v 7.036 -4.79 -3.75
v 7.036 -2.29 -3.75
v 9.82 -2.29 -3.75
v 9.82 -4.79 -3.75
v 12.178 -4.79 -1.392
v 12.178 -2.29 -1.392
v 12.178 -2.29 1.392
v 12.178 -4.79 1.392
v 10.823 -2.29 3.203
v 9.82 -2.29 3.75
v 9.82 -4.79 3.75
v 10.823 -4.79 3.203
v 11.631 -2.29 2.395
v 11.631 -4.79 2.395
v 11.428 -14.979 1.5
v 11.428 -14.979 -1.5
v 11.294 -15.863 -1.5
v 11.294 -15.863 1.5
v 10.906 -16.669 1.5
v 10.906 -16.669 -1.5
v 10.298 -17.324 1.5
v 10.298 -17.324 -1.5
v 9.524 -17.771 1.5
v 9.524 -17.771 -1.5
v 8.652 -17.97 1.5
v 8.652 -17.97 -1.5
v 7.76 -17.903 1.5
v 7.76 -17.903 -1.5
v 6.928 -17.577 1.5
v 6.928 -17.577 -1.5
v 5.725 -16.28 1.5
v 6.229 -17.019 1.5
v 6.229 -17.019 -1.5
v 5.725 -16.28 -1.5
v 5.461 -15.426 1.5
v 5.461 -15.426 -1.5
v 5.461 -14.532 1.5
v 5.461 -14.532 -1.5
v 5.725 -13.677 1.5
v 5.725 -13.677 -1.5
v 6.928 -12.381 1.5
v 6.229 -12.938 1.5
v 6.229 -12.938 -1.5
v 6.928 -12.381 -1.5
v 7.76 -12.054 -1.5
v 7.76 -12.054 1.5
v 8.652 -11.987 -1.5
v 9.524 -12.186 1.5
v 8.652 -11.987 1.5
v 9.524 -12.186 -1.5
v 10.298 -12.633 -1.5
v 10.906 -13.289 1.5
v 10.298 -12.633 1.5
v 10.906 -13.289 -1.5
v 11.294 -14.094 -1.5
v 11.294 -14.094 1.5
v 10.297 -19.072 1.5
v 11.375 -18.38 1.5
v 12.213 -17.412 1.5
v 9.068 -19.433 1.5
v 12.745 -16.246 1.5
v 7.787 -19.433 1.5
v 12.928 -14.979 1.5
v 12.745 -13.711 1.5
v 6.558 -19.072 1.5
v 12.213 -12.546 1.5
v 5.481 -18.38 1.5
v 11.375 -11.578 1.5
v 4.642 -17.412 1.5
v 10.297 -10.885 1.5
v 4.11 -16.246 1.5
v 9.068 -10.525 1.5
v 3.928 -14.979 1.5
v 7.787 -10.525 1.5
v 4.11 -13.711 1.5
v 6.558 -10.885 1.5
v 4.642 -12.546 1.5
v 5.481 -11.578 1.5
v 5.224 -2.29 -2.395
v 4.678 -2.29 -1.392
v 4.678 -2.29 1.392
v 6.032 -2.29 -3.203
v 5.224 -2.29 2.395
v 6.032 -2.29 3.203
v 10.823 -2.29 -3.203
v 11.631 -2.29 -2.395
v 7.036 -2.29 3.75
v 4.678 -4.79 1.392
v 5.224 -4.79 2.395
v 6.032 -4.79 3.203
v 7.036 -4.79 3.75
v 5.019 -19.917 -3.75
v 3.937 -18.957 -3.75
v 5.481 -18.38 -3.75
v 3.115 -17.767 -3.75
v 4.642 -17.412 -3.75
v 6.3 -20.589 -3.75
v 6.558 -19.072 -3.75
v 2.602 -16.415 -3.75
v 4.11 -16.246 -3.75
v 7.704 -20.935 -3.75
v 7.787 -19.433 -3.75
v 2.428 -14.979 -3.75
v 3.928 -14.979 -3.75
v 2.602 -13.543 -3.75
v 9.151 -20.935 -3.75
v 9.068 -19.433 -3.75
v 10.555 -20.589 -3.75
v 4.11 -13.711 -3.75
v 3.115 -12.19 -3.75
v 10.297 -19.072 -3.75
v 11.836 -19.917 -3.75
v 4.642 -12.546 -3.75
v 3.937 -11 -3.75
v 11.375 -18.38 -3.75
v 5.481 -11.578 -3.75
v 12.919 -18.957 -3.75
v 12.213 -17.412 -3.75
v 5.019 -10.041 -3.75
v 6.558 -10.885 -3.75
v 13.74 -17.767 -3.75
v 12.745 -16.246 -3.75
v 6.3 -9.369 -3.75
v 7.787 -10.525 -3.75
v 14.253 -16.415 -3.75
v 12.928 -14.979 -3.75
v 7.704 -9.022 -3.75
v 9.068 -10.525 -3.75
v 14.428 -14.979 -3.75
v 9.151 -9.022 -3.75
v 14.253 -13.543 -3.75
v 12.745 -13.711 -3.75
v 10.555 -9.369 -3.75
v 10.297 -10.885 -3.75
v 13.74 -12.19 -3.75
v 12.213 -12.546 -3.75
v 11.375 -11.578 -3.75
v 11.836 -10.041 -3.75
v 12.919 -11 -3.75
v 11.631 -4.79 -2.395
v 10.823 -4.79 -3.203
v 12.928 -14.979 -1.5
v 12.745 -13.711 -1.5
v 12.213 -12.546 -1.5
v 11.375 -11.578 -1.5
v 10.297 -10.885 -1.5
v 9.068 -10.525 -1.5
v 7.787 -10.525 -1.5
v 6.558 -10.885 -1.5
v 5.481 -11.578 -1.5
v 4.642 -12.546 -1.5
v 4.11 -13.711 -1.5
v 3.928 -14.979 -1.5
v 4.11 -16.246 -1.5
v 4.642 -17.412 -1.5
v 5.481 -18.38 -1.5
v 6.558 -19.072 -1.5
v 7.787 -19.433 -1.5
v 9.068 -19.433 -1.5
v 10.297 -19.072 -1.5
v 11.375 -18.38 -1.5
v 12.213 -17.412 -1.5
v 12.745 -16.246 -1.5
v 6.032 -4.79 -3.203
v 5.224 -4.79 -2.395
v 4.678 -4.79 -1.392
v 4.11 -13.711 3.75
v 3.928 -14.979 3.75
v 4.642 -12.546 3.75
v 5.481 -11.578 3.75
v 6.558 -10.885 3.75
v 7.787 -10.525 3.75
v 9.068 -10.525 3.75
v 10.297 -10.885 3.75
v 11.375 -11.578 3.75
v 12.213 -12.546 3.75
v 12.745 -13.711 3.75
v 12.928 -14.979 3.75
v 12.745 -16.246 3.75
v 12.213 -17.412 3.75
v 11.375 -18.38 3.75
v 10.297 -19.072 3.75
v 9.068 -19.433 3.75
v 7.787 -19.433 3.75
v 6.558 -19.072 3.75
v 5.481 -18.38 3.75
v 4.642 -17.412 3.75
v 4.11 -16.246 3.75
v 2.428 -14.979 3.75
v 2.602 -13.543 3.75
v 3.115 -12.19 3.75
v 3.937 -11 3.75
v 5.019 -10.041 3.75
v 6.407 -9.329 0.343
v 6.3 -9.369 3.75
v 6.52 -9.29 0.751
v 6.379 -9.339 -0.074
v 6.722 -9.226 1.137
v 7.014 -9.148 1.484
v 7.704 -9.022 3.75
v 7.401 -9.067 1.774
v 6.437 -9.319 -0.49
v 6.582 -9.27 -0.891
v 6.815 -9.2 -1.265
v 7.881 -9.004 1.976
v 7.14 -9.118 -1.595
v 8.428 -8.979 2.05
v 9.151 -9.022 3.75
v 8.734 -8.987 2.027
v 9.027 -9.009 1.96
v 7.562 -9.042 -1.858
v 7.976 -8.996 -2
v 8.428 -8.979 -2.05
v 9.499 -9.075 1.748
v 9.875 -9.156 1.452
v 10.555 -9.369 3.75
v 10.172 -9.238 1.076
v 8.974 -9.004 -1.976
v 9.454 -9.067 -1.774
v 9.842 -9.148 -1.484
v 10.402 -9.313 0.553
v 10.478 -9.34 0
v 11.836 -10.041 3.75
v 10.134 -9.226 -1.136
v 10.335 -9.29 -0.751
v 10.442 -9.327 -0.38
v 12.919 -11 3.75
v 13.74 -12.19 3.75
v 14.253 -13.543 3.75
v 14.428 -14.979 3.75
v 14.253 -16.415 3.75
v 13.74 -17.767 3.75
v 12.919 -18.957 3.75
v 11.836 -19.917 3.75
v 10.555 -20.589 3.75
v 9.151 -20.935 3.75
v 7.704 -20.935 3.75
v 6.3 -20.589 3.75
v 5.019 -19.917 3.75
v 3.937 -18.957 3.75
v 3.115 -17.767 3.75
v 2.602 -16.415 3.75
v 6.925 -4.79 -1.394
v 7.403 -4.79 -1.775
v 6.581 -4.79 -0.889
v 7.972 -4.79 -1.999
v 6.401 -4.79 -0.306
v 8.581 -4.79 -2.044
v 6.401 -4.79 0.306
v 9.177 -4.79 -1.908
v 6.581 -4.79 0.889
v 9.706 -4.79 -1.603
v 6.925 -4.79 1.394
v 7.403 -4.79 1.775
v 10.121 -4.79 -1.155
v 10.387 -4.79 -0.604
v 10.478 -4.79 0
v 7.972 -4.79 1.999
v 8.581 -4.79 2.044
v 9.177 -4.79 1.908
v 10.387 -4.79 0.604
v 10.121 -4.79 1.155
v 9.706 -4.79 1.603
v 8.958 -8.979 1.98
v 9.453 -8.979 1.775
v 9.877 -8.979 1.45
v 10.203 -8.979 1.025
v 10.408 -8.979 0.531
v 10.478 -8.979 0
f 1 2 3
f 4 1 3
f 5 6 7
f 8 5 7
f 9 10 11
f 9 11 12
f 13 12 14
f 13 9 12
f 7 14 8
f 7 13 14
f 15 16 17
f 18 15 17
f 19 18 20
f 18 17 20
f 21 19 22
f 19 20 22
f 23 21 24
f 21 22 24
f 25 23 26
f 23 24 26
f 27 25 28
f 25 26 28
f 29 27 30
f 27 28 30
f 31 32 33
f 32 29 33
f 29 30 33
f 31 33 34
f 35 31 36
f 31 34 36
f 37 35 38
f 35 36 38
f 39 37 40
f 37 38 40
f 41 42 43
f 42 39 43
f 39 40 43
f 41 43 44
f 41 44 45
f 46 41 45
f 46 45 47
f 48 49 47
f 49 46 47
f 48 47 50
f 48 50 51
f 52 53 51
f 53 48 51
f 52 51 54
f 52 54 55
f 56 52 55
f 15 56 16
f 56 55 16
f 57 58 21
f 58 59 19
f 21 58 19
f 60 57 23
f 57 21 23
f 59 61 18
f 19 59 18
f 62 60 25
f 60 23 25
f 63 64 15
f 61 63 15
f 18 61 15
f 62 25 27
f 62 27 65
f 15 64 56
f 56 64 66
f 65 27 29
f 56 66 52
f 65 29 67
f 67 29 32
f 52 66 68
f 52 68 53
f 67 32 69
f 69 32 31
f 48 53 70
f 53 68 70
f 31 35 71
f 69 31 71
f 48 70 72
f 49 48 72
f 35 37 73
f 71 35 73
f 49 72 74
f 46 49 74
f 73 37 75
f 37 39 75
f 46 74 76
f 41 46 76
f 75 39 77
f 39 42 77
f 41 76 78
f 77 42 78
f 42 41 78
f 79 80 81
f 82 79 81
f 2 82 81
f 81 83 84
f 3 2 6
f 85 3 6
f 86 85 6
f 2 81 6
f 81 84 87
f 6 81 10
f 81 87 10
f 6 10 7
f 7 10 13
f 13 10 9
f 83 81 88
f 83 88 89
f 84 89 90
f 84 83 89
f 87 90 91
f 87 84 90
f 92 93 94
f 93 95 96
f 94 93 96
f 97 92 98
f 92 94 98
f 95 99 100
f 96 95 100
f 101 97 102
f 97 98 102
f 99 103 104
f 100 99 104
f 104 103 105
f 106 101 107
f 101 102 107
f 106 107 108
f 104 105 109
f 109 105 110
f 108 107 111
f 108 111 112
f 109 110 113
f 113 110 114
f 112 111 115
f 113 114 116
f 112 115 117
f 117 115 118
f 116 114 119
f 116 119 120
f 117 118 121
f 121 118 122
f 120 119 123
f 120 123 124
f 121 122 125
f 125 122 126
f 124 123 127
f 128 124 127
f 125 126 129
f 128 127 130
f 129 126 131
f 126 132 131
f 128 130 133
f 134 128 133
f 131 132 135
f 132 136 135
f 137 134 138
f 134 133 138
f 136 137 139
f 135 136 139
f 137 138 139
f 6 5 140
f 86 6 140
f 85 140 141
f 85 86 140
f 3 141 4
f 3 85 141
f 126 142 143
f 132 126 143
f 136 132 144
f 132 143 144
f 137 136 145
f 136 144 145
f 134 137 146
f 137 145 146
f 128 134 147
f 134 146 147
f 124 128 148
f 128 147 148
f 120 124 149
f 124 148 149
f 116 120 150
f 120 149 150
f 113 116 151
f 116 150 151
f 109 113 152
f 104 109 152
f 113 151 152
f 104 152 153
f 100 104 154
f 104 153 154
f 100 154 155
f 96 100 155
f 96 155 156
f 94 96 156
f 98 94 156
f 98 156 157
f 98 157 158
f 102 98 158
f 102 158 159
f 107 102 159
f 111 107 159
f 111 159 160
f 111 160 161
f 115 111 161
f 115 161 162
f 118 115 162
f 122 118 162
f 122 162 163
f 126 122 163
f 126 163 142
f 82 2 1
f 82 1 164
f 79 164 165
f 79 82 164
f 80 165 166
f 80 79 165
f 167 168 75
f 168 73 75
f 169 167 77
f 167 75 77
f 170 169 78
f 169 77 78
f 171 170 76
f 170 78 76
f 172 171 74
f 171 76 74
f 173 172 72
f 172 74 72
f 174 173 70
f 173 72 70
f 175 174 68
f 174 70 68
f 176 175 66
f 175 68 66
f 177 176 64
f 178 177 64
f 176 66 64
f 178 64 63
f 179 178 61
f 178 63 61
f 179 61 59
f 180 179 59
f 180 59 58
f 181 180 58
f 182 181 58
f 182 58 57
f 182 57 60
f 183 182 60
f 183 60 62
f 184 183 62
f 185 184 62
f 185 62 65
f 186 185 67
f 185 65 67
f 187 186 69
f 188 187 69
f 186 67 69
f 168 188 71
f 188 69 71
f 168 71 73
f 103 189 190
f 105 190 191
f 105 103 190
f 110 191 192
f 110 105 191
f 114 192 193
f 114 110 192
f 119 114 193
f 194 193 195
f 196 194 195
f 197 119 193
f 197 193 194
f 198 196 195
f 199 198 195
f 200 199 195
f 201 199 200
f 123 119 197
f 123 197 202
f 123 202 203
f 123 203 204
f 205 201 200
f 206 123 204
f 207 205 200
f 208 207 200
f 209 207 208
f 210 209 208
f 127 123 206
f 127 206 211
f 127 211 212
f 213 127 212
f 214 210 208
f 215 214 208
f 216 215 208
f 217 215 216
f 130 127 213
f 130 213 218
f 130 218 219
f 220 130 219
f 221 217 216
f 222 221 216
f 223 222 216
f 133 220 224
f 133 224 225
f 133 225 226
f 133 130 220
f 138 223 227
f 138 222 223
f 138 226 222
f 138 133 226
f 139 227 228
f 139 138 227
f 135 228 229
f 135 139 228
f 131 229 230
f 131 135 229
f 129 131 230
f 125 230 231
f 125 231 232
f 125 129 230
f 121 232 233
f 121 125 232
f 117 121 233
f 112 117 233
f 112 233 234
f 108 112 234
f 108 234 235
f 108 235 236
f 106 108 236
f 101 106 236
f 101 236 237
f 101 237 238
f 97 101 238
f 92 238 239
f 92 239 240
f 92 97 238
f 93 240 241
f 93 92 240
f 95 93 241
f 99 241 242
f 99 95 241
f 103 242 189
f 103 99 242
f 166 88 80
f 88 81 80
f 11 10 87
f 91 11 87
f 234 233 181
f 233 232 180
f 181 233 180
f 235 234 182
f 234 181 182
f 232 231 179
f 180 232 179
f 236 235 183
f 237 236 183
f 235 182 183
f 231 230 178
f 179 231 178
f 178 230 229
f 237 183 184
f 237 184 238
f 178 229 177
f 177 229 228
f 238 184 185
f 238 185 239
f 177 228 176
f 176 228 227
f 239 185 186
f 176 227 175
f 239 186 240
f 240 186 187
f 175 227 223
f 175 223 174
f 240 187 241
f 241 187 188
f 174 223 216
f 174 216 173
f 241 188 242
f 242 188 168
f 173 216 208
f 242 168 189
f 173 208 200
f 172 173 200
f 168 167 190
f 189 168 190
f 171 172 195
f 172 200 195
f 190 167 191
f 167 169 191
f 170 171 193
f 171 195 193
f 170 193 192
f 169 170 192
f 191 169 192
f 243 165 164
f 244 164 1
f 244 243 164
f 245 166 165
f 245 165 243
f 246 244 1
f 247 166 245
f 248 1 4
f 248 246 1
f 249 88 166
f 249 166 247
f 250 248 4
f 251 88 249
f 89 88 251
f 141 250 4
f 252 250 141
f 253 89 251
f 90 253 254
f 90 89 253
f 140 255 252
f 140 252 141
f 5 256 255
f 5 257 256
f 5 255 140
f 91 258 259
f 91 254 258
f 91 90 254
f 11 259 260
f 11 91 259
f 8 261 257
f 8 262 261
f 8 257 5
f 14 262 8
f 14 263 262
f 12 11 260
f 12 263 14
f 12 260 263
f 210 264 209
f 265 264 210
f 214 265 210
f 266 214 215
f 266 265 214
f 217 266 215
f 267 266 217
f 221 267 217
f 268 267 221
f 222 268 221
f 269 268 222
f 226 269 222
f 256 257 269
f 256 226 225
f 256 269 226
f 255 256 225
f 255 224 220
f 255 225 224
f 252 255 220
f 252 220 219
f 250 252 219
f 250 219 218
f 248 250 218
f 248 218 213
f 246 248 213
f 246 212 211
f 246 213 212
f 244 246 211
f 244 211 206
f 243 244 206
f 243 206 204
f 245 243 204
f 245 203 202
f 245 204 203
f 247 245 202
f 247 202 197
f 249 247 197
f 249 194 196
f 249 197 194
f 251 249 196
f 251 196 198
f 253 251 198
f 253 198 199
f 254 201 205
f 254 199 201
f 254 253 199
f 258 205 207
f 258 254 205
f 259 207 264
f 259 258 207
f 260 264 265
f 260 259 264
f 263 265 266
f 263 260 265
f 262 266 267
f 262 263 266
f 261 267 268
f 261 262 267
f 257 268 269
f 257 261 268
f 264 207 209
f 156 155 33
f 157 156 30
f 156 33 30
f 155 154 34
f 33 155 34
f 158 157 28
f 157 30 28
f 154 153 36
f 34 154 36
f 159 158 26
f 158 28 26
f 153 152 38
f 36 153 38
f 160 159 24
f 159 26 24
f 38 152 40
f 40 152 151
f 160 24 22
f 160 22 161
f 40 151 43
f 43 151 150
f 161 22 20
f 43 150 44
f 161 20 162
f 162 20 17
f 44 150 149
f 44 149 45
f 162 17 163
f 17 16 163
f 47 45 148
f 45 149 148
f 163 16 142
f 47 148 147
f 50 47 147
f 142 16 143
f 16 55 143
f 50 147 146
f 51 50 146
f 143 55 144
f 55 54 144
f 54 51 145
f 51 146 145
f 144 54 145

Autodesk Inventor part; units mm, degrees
ref_plane "YZ Plane" through (0, 0, 0) normal (1, 0, 0) x (0, 1, 0)
ref_plane "XZ Plane" through (0, 0, 0) normal (0, 1, 0) x (-1, 0, 0)
ref_plane "XY Plane" through (0, 0, 0) normal (0, 0, 1) x (1, 0, 0)
sketch "Sketch1" plane through (0, 0, 0) normal (0, 0, 1) x (1, 0, 0)
  point P0 (0, 0)
sketch "Sketch2" plane through (0, 0, 0) normal (0, 0, 1) x (1, 0, 0)
  line L0 (12.1777, -1.5396) -> (4.6777, -1.5396) construction
  line L1 (4.6777, -1.5396) -> (4.6777, -5.5396) construction
  line L2 (4.6777, -5.5396) -> (12.1777, -5.5396) construction
  line L3 (12.1777, -5.5396) -> (12.1777, -1.5396) construction
  line L4 (8.4277, -4.7896) -> (12.4277, -4.7896)
  line L5 (12.4277, -4.7896) -> (12.4277, -2.2896)
  line L6 (12.4277, -2.2896) -> (8.4277, -2.2896)
  line L7 (8.4277, -2.2896) -> (8.4277, -4.7896)
  line L8 (8.4277, -2.2896) -> (8.4277, -8.9787)
  line L9 (8.4277, -8.9787) -> (10.4777, -8.9787)
  line L10 (10.4777, -8.9787) -> (10.4777, -4.7896)
  line L11 (9.1419, -2.2896) -> (9.1419, -1.5396) construction
  line L12 (9.1419, -4.7896) -> (9.1419, -5.5396) construction
  point P0 (0, 0)
  dimension "d0" = 7.5
  dimension "d1" = 4
  dimension "d2" = 8
  dimension "d3" = 2.5
  dimension "d4" = 4.1
  dimension "d6" = 0.75
revolve "Revolution1" add sketch "Sketch2" angle 360 about axis through (8.4277, -2.2896, 0) along (0, -1, 0)
sketch "Sketch3" plane through (8.4277, -8.9787, 0) normal (0, -1, 0) x (1, 0, 0)
  line L0 (6, 3.75) -> (-6, 3.75)
  line L1 (-6, 3.75) -> (-6, -3.75)
  line L2 (-6, -3.75) -> (6, -3.75)
  line L3 (6, -3.75) -> (6, 3.75)
  line L4 (6, 3.75) -> (-6, -3.75) construction
  line L5 (-6, 3.75) -> (6, -3.75) construction
  circle A0 centre (0, 0) radius 2.05 projected
  point P0 (-8.4277, 0)
  point P1 (0, 0)
  dimension "d7" = 12
  dimension "d8" = 7.5
extrude "Extrusion1" add sketch "Sketch3" along normal blind 12 contours L3 L2 L1 L0 | A0
sketch "Sketch4" plane through (14.4277, -8.9787, -3.75) normal (0, 0, -1) x (-1, 0, 0)
  line L0 (12, 0) -> (0, 0) projected
  line L1 (0, 0) -> (0, -12) projected
  line L2 (12, -12) -> (0, -12) projected
  line L3 (12, 0) -> (12, -12) projected
  circle A0 centre (6, -6) radius 6
  point P0 (14.4277, 8.9787)
  point P1 (0, -6)
  point P2 (6, 0)
  point P3 (12, -6)
  point P4 (6, -12)
extrude "Extrusion2" cut sketch "Sketch4" against normal blind 12 contours L3 A0 L0 | A0 L1 L0 | L3 L2 A0 | A0 L2 L1
sketch "Sketch6" plane through (0, 0, 0) normal (0, 0, 1) x (1, 0, 0)
  circle A0 centre (8.4277, -14.9787) radius 6 projected
  circle A1 centre (8.4277, -14.9787) radius 3
  point P0 (0, 0)
  dimension "d13" = 6
extrude "Extrusion3" cut sketch "Sketch6" along normal mid plane 3 contours A1
sketch "Sketch7" plane through (8.4277, -14.9787, 1.5) normal (0, 0, -1) x (-1, 0, 0)
  circle A0 centre (0, 0) radius 3 projected
  circle A1 centre (0, 0) radius 4.5
  point P0 (8.4277, 14.9787)
  dimension "d16" = 9
extrude "Extrusion4" cut sketch "Sketch7" against normal blind 8.25 contours A0 | A1
sketch "Sketch8" plane through (8.4277, -14.9787, -1.5) normal (0, 0, 1) x (1, 0, 0)
  circle A0 centre (0, 0) radius 4.5 projected
  point P0 (-8.4277, 14.9787)
extrude "Extrusion5" cut sketch "Sketch8" against normal blind 8.25
sketch "Sketch9" plane through (8.4277, -2.2896, 0) normal (0, 1, 0) x (1, 0, 0)
  circle A0 centre (0, 0) radius 4 projected
  line L0 (3.75, -3.75) -> (-3.75, -3.75)
  line L1 (-3.75, -3.75) -> (-3.75, 3.75)
  line L2 (-3.75, 3.75) -> (3.75, 3.75)
  line L3 (3.75, 3.75) -> (3.75, -3.75)
  line L4 (3.75, -3.75) -> (-3.75, 3.75) construction
  line L5 (-3.75, -3.75) -> (3.75, 3.75) construction
  point P0 (-3.75, -1.3919)
  point P1 (-3.75, 1.3919)
  point P2 (1.3919, -3.75)
  point P3 (-1.3919, -3.75)
  point P4 (3.75, 1.3919)
  point P5 (3.75, -1.3919)
  point P6 (-1.3919, 3.75)
  point P7 (1.3919, 3.75)
  dimension "d23" = 7.5
extrude "Extrusion6" cut sketch "Sketch9" against normal up to surface (2.5 mm away) contours A0 L3 | L2 A0 | A0 L0 | L1 A0
sketch "Sketch10" plane through (8.4277, -8.9787, 0) normal (0, -1, 0) x (1, 0, 0)
  line L0 (-1.3919, 3.75) -> (1.3919, 3.75) projected
  arc A0 (3.75, 1.3919) -> (1.3919, 3.75) centre (0, 0) ccw projected
  line L1 (3.75, 1.3919) -> (3.75, -1.3919) projected
  arc A1 (1.3919, -3.75) -> (3.75, -1.3919) centre (0, 0) ccw projected
  line L2 (1.3919, -3.75) -> (-1.3919, -3.75) projected
  arc A2 (-3.75, -1.3919) -> (-1.3919, -3.75) centre (0, 0) ccw projected
  line L3 (-3.75, -1.3919) -> (-3.75, 1.3919) projected
  arc A3 (-1.3919, 3.75) -> (-3.75, 1.3919) centre (0, 0) ccw projected
  circle A4 centre (0, 0) radius 2.05 projected
  point P0 (-8.4277, 0)
extrude "Extrusion7" add sketch "Sketch10" along normal up to surface contours A4
properties part number "Sholder"
